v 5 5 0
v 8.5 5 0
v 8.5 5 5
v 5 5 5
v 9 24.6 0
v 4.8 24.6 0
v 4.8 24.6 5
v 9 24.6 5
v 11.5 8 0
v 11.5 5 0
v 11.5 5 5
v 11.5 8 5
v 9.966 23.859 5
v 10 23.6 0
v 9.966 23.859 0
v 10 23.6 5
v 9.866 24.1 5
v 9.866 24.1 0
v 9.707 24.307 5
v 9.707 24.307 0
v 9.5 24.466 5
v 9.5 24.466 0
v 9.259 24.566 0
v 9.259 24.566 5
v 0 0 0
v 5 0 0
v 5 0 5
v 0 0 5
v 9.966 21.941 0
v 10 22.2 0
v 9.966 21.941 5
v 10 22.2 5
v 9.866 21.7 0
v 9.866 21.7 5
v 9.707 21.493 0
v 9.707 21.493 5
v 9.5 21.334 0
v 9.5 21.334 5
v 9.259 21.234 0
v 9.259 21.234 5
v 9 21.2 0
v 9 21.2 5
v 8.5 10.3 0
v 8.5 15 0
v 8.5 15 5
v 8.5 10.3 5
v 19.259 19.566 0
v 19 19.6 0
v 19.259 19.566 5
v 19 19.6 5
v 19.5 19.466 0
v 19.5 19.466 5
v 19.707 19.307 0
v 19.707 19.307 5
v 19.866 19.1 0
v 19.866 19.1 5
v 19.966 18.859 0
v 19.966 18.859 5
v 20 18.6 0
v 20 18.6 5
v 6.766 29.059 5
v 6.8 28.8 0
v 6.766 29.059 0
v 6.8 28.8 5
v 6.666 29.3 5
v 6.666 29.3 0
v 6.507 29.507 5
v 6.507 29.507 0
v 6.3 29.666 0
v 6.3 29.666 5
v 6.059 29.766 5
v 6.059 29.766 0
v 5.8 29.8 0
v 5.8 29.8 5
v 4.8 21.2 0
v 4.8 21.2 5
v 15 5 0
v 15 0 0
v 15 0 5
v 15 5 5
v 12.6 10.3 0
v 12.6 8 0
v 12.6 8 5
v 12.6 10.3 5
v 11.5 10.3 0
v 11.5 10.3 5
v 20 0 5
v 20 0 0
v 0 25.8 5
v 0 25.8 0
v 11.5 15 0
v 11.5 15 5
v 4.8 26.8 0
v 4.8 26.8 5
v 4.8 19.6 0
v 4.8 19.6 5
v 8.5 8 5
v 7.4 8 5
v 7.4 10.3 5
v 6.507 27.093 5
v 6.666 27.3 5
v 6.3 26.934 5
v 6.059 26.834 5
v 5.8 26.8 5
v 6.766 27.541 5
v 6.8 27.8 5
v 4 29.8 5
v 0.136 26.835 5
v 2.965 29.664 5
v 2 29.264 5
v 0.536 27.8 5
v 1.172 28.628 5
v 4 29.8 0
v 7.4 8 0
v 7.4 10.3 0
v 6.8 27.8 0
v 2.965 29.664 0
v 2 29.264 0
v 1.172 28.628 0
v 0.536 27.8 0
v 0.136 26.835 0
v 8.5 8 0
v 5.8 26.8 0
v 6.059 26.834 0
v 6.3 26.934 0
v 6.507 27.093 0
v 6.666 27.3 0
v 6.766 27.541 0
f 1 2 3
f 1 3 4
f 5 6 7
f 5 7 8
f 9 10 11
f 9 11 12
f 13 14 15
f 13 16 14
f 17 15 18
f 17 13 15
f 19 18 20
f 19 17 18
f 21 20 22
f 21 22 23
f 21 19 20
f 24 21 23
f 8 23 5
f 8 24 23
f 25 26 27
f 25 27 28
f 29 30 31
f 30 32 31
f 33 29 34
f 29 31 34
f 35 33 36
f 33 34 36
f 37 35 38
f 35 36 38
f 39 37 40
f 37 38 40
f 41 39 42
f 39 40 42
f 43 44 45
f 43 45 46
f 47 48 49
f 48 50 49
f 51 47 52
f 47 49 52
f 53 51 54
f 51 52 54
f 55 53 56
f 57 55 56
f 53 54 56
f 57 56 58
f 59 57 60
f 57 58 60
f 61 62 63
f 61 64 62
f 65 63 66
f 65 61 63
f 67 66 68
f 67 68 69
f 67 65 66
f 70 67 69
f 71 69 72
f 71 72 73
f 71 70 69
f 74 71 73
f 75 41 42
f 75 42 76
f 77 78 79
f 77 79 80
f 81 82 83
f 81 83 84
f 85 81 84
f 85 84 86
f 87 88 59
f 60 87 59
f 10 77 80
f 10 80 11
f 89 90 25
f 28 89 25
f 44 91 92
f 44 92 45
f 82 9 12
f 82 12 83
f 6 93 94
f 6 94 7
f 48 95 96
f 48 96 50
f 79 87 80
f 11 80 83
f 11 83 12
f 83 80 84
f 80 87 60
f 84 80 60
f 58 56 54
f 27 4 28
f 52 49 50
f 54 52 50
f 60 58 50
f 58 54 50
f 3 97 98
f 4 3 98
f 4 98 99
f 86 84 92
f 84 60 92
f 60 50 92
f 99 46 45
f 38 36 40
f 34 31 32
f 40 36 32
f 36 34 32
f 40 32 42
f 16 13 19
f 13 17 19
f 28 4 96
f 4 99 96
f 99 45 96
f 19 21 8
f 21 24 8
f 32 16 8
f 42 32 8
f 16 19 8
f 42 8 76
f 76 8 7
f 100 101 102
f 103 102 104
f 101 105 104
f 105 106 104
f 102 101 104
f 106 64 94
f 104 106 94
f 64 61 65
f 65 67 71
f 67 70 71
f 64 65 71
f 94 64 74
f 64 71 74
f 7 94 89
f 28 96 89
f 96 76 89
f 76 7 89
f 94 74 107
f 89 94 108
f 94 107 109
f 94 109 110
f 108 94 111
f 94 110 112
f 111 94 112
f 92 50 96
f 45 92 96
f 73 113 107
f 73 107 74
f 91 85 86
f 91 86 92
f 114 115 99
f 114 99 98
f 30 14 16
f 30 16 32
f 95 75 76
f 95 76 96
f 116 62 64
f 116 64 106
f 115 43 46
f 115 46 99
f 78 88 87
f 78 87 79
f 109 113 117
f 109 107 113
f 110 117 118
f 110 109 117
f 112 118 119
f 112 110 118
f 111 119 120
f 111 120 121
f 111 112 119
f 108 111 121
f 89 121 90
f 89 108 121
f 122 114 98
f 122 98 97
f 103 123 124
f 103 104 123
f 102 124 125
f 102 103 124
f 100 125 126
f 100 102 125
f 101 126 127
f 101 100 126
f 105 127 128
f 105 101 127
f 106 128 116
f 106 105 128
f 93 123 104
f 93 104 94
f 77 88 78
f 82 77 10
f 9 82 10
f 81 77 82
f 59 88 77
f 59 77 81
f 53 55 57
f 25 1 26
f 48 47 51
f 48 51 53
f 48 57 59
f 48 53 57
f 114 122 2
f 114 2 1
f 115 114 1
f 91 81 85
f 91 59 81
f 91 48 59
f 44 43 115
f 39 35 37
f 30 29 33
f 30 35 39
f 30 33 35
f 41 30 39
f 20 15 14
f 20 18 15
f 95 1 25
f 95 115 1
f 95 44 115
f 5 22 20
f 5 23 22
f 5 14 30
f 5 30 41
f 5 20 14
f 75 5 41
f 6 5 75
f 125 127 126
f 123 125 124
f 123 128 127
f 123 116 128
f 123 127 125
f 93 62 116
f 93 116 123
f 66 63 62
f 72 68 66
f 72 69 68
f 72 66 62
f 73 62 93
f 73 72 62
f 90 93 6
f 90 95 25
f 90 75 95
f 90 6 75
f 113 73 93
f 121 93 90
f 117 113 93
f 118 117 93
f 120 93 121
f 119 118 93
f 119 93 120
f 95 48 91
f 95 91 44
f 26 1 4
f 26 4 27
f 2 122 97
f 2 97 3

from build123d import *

# Parameters (mm, degrees)
BOSS_EXTRUDE1_DEPTH = 5
FILLET3_R           = 1
FILLET4_R           = 1
FILLET5_R           = 4


with BuildPart() as part:
    # Sketch1 → Boss-Extrude1 (new body)
    with BuildSketch(Plane.XY):
        Polygon((0, 5), (0, 19.982808697), (0, 24.6), (0, 29.8), (6.8, 29.8), (6.8, 26.8), (4.8, 26.8), (4.8, 24.6), (10, 24.6), (10, 21.2), (4.8, 21.2), (4.8, 19.6), (20, 19.6), (20, 5), (20, 0), (15, 0), (15, 5), (11.5, 5), (11.5, 8), (12.6, 8), (12.6, 10.3), (11.5, 10.3), (11.5, 15), (8.5, 15), (8.5, 10.3), (7.4, 10.3), (7.4, 8), (8.5, 8), (8.5, 5), (5, 5), (5, 0), (0, 0), align=None)
    extrude(amount=BOSS_EXTRUDE1_DEPTH)

    # Fillet3
    fillet3_edges = [part.edges().sort_by_distance(p)[0] for p in [
        (10, 21.2, 2.5),
        (20, 19.6, 2.5),
    ]]
    fillet(fillet3_edges, radius=FILLET3_R)

    # Fillet4
    fillet4_edges = [part.edges().sort_by_distance(p)[0] for p in [
        (6.8, 29.8, 2.5),
        (6.8, 26.8, 2.5),
        (10, 24.6, 2.5),
    ]]
    fillet(fillet4_edges, radius=FILLET4_R)

    # Fillet5
    fillet5_edges = [part.edges().sort_by_distance(p)[0] for p in [
        (0, 29.8, 2.5),
    ]]
    fillet(fillet5_edges, radius=FILLET5_R)


solid = part.part
